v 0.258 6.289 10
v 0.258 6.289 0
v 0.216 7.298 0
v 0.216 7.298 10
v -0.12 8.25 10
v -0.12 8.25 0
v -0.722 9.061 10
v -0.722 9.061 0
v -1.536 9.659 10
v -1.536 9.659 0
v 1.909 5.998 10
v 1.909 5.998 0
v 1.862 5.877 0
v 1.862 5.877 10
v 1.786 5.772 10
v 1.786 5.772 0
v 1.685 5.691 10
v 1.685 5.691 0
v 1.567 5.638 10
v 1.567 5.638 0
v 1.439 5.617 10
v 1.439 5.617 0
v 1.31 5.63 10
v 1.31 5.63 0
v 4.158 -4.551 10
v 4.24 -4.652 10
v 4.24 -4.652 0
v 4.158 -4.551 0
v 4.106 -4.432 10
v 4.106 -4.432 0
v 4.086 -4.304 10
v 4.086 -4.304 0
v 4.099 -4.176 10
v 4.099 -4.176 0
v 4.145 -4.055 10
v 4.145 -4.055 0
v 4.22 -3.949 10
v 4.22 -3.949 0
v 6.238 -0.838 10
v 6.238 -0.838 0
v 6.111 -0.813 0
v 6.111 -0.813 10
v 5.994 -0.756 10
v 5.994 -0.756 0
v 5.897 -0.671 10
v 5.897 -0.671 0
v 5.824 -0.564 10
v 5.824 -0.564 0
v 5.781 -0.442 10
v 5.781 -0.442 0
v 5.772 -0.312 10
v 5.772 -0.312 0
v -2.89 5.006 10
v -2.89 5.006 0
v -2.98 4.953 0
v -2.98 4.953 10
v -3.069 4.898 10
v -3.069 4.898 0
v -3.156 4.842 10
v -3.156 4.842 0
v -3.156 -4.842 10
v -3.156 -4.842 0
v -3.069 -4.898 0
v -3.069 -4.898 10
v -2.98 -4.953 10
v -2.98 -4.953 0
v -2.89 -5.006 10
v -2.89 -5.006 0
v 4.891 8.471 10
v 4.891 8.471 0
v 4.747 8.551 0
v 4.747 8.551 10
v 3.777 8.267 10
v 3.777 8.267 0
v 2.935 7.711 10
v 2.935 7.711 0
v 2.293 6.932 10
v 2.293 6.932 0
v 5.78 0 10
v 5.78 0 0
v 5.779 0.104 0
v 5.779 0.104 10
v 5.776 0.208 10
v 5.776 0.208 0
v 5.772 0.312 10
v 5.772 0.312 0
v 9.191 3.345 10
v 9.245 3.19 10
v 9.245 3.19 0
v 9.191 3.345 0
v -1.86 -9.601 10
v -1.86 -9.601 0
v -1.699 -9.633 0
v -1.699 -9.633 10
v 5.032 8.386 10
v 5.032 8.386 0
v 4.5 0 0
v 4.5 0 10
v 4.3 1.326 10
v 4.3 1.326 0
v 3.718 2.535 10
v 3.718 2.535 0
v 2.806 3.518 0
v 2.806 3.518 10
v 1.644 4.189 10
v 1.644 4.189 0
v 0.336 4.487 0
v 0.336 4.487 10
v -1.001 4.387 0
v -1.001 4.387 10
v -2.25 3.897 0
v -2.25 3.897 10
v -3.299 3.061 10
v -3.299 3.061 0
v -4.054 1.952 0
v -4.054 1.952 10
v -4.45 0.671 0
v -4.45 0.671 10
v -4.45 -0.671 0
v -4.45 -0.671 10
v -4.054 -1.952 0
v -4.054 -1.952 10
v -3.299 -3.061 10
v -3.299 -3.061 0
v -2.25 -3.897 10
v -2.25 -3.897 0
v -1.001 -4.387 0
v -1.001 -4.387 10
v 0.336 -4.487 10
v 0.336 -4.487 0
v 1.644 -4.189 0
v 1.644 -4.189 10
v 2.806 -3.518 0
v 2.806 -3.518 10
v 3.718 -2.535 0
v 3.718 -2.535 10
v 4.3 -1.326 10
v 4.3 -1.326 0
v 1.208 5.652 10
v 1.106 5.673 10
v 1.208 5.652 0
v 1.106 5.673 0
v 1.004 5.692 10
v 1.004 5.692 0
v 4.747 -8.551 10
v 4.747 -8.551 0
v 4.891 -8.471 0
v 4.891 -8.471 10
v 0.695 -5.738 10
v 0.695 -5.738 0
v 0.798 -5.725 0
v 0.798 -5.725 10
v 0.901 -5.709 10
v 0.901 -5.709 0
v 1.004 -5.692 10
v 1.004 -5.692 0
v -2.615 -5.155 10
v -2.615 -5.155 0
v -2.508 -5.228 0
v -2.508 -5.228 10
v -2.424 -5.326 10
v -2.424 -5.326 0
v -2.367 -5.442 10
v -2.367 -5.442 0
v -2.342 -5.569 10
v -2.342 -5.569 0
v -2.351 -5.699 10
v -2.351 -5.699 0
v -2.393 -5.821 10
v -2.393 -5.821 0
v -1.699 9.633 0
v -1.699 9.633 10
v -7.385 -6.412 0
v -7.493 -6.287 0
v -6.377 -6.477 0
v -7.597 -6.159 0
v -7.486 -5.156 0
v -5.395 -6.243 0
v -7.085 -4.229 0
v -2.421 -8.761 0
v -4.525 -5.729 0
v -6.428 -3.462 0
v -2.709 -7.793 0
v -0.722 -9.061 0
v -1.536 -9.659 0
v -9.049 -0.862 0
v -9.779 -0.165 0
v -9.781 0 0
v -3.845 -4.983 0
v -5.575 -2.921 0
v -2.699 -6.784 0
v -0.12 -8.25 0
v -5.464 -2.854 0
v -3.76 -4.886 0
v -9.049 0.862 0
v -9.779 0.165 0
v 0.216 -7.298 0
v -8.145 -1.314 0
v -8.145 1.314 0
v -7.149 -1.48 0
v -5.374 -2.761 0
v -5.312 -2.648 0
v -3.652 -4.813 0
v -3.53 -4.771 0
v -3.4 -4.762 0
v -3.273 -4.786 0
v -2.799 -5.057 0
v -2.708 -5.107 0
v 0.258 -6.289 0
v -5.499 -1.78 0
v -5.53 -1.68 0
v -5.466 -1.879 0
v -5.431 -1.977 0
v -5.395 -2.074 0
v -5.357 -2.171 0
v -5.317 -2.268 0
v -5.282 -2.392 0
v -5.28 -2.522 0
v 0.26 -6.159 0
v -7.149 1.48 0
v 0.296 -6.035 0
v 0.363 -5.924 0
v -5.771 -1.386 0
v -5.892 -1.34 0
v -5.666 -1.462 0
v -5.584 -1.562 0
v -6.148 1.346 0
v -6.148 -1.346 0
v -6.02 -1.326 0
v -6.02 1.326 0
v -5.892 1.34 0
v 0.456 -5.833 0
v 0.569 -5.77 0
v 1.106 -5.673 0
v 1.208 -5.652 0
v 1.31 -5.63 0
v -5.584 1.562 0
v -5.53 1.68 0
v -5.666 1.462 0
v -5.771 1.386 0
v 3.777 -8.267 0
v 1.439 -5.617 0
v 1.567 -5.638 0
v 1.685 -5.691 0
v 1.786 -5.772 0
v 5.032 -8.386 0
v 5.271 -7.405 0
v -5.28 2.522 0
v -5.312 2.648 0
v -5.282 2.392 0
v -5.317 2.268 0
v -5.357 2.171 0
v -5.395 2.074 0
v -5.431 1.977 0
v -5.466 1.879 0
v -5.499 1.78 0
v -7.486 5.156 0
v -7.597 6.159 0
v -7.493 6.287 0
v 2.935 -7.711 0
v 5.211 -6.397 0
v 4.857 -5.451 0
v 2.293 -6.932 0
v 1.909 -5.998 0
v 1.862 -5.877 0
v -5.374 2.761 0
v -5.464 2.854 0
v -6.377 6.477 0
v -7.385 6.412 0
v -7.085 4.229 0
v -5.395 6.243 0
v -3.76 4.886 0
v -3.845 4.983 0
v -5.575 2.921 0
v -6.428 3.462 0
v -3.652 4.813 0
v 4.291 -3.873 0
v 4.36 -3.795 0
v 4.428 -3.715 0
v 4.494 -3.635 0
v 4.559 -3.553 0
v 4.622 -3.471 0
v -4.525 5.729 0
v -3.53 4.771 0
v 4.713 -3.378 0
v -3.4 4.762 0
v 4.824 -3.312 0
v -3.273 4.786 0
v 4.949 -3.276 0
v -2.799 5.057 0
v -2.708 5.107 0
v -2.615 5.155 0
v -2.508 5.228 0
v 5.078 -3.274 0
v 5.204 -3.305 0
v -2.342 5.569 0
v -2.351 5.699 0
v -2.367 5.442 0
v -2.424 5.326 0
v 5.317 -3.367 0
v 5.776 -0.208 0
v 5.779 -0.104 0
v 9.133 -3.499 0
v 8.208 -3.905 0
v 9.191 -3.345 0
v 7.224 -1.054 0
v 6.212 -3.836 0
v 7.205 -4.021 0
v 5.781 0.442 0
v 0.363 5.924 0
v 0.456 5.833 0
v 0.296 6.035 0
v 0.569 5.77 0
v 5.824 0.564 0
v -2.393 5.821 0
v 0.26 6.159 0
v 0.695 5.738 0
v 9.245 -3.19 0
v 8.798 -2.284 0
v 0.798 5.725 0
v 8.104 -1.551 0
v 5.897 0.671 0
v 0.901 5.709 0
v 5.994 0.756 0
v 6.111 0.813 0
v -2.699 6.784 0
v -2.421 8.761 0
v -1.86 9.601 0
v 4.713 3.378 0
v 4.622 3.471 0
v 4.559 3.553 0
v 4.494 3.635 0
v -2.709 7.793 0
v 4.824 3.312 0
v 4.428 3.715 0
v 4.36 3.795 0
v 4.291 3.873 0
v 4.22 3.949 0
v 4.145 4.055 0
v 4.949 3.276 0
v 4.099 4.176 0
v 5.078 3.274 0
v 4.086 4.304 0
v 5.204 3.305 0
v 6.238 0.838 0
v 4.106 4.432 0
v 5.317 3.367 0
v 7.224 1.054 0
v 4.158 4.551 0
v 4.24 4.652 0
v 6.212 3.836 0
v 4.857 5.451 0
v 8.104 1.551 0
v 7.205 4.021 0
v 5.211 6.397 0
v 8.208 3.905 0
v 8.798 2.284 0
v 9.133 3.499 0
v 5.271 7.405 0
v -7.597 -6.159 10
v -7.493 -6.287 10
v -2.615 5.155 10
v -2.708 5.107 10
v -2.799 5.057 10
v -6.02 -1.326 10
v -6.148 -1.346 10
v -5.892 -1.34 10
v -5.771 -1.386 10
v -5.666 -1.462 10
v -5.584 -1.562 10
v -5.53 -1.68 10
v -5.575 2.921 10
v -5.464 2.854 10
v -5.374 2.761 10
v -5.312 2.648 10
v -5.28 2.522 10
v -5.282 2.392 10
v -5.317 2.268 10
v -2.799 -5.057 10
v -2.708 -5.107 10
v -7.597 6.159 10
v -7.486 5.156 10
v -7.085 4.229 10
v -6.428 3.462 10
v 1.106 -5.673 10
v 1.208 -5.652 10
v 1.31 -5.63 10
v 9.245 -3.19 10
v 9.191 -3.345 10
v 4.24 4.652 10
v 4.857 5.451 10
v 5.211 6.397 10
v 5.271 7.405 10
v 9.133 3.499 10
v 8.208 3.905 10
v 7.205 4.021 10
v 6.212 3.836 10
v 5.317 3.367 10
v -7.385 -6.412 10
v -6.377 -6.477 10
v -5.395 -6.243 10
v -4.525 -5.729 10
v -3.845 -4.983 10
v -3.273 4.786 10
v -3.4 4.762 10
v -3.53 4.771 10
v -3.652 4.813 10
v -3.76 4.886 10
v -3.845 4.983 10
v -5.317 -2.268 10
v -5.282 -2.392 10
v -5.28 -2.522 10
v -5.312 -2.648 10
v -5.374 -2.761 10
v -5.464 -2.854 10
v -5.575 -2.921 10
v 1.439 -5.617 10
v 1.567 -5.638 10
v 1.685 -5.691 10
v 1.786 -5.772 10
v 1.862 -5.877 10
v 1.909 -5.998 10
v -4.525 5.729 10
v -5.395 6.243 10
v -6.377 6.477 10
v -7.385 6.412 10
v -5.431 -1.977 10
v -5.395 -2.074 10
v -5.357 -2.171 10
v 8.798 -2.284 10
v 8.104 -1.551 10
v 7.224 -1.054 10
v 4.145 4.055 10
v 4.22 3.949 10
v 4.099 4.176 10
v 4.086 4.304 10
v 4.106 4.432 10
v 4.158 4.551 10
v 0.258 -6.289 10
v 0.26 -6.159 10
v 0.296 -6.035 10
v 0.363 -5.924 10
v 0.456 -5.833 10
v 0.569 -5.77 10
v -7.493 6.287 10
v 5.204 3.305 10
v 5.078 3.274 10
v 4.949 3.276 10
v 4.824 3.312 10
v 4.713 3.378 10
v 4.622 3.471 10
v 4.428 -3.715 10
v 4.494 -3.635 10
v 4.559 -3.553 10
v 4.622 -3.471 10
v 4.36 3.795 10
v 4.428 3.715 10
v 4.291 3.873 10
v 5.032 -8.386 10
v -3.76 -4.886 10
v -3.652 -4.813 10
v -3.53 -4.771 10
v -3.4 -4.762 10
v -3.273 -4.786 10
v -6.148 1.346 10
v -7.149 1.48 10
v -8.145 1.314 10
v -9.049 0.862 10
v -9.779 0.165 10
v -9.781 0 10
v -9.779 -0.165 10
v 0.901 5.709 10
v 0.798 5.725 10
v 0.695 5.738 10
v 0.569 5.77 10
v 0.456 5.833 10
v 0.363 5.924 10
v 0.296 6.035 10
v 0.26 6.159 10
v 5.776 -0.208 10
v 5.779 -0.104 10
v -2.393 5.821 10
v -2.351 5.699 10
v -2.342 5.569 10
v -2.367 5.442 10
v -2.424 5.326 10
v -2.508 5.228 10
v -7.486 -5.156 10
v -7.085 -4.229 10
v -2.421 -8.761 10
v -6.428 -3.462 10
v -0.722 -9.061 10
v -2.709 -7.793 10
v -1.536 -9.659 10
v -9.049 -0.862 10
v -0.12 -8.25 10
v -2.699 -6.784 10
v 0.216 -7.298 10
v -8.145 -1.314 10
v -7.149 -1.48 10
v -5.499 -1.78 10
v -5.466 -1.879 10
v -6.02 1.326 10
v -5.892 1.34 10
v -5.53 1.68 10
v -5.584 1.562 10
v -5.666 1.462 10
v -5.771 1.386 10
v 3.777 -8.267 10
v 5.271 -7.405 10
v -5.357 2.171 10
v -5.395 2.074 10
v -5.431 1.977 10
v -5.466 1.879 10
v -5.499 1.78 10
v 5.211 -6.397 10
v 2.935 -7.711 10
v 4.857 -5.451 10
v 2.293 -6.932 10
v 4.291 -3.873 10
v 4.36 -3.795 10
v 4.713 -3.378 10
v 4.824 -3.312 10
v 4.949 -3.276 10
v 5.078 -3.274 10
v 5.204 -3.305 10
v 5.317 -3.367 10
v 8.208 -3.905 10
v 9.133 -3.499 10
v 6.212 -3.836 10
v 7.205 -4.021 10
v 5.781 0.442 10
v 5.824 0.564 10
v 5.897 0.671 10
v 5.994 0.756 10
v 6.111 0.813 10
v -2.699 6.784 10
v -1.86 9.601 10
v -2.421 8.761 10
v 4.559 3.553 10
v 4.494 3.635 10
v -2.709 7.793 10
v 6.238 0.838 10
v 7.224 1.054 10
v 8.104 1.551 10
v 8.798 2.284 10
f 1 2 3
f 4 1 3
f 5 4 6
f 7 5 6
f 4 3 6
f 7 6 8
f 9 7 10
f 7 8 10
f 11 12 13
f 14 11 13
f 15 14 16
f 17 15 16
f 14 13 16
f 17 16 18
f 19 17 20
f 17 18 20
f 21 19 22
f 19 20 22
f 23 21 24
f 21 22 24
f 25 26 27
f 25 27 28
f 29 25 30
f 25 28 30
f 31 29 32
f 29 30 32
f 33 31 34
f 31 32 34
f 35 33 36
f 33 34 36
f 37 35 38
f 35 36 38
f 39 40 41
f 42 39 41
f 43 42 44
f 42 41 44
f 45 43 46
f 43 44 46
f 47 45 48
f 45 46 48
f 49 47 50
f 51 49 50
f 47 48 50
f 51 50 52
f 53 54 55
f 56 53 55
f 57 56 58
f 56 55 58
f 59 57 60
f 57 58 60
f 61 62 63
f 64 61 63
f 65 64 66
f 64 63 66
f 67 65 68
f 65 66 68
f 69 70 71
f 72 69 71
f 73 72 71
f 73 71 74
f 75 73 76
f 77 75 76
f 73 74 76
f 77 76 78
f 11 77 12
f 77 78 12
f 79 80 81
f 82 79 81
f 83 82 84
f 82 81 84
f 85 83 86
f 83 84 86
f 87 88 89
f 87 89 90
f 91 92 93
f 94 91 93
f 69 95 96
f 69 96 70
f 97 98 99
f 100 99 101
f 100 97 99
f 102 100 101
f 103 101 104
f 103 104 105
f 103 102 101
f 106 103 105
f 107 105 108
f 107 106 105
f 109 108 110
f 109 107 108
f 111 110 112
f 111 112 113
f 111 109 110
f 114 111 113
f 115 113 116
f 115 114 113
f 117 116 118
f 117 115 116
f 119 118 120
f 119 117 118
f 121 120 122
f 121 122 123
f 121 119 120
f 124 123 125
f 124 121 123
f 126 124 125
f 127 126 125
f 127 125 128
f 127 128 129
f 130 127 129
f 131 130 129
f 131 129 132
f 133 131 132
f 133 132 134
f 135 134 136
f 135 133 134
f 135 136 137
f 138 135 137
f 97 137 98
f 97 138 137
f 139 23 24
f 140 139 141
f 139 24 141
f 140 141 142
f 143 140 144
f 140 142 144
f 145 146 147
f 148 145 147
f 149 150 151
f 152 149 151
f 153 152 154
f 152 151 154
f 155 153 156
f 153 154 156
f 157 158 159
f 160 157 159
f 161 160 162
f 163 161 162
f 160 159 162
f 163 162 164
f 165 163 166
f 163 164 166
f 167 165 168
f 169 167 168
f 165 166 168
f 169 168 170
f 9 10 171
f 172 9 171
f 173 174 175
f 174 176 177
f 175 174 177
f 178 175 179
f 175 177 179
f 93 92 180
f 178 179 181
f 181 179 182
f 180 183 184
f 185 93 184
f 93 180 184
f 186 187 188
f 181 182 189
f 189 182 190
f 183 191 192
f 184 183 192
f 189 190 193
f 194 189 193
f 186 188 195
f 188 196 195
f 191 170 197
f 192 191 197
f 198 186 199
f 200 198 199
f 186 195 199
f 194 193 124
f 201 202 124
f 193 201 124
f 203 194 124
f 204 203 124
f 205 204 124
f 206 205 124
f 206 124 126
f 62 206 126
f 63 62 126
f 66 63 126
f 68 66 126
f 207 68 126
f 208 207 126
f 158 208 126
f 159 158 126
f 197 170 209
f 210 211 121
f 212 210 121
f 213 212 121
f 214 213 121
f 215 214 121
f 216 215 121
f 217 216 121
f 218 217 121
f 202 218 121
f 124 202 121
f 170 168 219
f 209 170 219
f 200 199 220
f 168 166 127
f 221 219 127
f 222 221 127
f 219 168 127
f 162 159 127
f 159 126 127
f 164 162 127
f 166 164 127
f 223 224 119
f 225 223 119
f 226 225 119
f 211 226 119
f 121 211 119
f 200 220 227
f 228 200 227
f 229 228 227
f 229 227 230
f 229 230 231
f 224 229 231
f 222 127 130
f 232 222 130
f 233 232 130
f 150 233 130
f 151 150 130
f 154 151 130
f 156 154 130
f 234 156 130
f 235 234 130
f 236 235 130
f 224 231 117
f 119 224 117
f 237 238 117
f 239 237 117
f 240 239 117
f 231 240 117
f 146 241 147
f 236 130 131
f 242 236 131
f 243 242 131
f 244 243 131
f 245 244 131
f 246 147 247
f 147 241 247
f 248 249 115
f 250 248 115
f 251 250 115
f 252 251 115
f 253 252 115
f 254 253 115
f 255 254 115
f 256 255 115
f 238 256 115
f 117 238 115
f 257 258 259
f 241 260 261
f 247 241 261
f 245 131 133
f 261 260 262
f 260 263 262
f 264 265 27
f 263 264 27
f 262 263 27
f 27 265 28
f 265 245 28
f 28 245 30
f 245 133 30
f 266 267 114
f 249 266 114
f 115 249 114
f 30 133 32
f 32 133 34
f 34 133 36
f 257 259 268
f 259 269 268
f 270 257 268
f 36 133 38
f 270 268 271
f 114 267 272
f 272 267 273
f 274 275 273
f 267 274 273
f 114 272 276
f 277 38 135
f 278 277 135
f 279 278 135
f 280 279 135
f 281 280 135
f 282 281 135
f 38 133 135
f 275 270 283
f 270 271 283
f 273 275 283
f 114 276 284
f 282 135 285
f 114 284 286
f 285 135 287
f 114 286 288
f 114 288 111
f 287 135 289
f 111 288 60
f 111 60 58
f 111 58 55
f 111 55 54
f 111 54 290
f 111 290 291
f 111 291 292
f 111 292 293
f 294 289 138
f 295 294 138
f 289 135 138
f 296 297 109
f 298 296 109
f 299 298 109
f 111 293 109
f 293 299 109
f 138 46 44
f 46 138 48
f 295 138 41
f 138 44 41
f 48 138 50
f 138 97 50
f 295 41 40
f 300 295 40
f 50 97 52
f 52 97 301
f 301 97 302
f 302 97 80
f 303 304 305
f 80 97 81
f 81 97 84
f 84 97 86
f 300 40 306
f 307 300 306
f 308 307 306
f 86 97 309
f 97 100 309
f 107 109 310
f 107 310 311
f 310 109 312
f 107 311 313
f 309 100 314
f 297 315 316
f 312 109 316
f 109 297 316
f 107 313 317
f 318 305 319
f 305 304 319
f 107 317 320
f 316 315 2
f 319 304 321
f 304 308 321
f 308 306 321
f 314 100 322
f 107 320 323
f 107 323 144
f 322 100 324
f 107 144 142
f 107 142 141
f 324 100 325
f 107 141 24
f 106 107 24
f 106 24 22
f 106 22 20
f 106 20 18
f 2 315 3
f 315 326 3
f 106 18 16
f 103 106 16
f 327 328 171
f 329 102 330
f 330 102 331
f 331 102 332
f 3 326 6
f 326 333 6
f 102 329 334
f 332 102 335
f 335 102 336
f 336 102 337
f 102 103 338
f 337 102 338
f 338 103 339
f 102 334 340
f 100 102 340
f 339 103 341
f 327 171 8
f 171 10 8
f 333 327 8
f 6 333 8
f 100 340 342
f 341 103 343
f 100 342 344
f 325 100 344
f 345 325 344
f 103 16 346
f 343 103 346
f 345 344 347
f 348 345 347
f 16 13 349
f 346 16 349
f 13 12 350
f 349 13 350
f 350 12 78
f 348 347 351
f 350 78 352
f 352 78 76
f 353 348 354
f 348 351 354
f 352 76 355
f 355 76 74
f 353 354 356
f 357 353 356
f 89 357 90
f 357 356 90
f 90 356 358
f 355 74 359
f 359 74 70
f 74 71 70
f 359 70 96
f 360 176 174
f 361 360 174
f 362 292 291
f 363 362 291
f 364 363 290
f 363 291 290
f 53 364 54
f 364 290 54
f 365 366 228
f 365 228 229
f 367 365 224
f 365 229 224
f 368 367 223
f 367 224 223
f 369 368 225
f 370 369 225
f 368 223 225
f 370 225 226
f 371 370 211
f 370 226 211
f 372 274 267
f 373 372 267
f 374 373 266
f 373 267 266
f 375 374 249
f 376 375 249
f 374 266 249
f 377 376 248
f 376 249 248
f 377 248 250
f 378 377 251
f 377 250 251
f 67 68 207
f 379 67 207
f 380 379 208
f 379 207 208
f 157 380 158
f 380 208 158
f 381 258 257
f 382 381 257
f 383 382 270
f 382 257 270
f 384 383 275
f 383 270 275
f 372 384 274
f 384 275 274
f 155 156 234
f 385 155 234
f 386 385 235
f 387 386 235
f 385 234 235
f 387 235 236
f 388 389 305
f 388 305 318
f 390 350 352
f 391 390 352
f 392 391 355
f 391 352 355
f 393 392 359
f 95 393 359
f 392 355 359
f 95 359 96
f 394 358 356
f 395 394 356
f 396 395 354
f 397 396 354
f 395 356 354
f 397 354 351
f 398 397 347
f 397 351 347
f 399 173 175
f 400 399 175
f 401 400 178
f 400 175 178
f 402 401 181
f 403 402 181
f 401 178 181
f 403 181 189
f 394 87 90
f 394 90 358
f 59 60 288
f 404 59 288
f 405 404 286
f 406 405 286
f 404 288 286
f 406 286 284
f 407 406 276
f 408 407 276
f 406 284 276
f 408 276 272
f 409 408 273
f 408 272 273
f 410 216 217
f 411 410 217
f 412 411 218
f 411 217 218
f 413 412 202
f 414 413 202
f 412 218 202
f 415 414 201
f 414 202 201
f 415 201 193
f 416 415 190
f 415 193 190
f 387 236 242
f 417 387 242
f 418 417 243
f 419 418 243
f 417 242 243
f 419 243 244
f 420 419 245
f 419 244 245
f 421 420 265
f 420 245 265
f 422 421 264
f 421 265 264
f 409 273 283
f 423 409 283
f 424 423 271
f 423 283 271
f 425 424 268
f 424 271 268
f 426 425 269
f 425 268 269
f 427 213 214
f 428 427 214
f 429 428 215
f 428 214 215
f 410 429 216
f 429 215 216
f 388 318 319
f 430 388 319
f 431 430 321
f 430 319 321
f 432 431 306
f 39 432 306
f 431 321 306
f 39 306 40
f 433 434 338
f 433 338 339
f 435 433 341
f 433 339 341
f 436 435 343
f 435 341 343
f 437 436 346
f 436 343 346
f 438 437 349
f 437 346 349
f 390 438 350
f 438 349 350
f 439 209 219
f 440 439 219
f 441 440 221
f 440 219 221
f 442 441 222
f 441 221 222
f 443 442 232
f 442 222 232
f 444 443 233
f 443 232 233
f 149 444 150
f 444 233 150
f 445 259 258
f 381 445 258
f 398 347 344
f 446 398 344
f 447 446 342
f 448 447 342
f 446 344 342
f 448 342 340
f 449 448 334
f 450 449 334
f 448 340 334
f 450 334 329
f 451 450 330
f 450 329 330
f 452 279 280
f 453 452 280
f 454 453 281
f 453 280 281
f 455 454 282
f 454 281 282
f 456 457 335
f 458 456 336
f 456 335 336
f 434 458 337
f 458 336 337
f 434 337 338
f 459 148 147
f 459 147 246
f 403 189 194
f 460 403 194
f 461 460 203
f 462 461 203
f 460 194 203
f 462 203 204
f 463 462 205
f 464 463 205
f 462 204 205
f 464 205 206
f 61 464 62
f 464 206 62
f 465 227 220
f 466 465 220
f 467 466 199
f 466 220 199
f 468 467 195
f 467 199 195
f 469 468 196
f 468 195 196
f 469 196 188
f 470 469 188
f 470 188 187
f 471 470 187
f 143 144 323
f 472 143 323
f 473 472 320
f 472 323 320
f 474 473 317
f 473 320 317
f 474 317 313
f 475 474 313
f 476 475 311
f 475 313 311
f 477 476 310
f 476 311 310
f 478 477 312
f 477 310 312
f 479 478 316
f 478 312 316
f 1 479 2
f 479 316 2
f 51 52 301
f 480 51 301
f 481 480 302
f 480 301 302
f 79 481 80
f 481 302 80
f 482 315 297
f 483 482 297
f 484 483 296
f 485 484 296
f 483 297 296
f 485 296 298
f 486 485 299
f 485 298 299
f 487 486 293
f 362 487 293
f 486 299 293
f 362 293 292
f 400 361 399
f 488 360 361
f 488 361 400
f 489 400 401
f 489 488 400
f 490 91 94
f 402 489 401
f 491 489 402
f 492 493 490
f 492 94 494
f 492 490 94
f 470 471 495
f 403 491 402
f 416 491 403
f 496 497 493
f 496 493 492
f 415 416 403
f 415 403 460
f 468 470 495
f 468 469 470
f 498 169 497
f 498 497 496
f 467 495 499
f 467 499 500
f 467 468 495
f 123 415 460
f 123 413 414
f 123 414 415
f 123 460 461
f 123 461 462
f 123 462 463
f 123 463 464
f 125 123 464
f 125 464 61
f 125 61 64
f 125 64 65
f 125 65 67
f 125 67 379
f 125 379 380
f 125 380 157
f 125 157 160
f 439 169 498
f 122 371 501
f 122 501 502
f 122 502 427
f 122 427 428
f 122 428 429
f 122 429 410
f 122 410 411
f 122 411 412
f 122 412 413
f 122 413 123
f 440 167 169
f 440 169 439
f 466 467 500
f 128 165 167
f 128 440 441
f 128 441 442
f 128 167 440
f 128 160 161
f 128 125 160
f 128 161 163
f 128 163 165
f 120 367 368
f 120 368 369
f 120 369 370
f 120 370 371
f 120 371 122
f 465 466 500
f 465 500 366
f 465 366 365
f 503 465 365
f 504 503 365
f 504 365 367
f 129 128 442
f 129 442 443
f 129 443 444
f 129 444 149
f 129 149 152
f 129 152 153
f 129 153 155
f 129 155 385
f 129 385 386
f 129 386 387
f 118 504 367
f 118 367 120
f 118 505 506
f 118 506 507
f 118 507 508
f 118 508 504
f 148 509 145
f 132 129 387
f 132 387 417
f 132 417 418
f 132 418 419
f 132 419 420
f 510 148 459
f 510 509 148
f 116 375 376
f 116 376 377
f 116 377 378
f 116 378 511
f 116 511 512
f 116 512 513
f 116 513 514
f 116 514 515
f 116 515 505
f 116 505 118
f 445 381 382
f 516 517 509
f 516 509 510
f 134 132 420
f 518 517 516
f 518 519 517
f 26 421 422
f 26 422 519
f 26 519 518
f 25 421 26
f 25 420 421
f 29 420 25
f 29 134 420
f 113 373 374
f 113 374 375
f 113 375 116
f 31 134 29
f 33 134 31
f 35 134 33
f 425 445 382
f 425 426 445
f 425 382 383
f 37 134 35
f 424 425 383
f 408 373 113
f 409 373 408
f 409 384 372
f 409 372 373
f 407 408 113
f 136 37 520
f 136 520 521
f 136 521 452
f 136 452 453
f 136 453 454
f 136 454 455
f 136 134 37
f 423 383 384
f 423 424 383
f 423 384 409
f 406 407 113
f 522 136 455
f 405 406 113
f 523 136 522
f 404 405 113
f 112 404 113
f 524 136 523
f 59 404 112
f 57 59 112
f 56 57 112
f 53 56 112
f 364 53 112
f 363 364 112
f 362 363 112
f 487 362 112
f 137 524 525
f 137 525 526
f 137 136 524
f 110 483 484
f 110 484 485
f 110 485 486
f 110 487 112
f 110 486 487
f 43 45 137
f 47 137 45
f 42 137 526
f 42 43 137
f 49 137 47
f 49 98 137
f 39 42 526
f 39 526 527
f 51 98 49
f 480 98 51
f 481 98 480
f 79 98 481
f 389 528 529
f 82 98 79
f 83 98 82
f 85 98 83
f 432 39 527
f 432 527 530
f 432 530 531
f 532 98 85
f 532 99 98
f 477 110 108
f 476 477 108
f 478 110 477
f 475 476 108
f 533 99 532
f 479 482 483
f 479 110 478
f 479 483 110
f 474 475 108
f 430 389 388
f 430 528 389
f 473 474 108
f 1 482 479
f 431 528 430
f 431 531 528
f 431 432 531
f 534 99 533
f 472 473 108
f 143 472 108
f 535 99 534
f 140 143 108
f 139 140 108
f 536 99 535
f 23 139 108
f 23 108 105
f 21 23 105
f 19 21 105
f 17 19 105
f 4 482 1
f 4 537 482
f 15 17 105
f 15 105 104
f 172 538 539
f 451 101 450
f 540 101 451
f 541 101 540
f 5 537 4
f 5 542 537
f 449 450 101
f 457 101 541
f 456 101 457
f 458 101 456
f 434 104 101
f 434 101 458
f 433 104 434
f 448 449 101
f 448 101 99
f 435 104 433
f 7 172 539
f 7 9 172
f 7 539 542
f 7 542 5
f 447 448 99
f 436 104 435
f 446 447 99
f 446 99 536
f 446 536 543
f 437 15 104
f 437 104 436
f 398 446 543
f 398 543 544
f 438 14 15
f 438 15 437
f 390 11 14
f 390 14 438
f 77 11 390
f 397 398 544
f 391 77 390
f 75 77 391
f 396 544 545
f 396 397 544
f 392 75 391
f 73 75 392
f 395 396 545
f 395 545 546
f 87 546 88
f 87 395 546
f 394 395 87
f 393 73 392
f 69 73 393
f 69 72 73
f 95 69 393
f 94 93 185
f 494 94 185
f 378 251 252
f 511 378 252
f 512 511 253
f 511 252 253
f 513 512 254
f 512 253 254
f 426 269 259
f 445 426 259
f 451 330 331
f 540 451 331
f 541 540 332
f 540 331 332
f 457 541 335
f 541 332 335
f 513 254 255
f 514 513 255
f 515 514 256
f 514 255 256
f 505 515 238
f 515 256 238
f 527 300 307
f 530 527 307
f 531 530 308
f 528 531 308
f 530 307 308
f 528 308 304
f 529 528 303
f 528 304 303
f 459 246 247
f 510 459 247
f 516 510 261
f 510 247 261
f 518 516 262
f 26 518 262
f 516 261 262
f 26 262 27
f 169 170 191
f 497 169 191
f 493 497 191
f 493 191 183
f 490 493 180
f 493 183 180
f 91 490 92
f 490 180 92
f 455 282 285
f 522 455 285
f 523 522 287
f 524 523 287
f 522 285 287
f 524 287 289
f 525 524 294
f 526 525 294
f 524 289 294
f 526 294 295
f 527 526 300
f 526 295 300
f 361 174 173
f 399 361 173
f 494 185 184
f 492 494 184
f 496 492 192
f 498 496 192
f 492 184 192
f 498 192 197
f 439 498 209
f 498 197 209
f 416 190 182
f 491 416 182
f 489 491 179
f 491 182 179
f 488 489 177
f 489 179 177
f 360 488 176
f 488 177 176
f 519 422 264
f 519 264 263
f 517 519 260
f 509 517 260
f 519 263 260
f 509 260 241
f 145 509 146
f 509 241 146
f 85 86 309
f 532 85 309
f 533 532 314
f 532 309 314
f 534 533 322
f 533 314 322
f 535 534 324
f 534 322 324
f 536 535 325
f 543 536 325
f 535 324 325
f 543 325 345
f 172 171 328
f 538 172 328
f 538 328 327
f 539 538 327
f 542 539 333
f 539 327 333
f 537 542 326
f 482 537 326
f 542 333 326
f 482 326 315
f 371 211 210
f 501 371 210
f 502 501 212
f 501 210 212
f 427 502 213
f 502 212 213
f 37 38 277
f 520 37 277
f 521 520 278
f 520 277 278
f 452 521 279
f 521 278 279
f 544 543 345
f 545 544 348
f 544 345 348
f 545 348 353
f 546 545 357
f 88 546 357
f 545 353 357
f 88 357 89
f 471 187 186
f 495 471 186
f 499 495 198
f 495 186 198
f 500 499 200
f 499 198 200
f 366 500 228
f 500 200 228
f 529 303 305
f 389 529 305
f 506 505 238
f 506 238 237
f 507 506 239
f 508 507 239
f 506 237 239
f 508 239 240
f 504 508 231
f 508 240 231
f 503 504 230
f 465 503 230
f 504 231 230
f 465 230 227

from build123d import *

# Parameters (mm, degrees)
F0_R     = 4.5
F1_DEPTH = 10


with BuildPart() as f1:
    # F0 (on Top) → F1 (new body)
    with BuildSketch(Plane.XY):
        with BuildLine():
            ThreePointArc((-2.392851, 5.821348), (-2.36707, 5.442285), (-2.615174, 5.154538))
            ThreePointArc((-2.615174, 5.154538), (-2.753594, 5.081941), (-2.89, 5.005627))
            ThreePointArc((-2.89, 5.005627), (-3.024293, 4.925652), (-3.156374, 4.842076))
            ThreePointArc((-3.156374, 4.842076), (-3.529622, 4.771085), (-3.84501, 4.982943))
            ThreePointArc((-3.84501, 4.982943), (-5.394961, 6.242549), (-7.385022, 6.411696))
            Line((-7.385022, 6.411696), (-7.492977, 6.287354))
            Line((-7.492977, 6.287354), (-7.596684, 6.159448))
            ThreePointArc((-7.596684, 6.159448), (-7.084536, 4.228992), (-5.57492, 2.921316))
            ThreePointArc((-5.57492, 2.921316), (-5.311514, 2.647509), (-5.316613, 2.267604))
            ThreePointArc((-5.316613, 2.267604), (-5.375984, 2.123017), (-5.431423, 1.976876))
            ThreePointArc((-5.431423, 1.976876), (-5.482891, 1.829291), (-5.53035, 1.680367))
            ThreePointArc((-5.53035, 1.680367), (-5.770641, 1.386066), (-6.148423, 1.345631))
            ThreePointArc((-6.148423, 1.345631), (-8.145413, 1.314256), (-9.778614, 0.164643))
            Line((-9.778614, 0.164643), (-9.781386, 0))
            Line((-9.781386, 0), (-9.778614, -0.164643))
            ThreePointArc((-9.778614, -0.164643), (-8.145413, -1.314256), (-6.148423, -1.345631))
            ThreePointArc((-6.148423, -1.345631), (-5.770641, -1.386066), (-5.53035, -1.680367))
            ThreePointArc((-5.53035, -1.680367), (-5.482891, -1.829291), (-5.431423, -1.976876))
            ThreePointArc((-5.431423, -1.976876), (-5.375984, -2.123017), (-5.316613, -2.267604))
            ThreePointArc((-5.316613, -2.267604), (-5.311514, -2.647509), (-5.57492, -2.921316))
            ThreePointArc((-5.57492, -2.921316), (-7.084536, -4.228992), (-7.596684, -6.159448))
            Line((-7.596684, -6.159448), (-7.492977, -6.287354))
            Line((-7.492977, -6.287354), (-7.385022, -6.411696))
            ThreePointArc((-7.385022, -6.411696), (-5.394961, -6.242549), (-3.84501, -4.982943))
            ThreePointArc((-3.84501, -4.982943), (-3.529622, -4.771085), (-3.156374, -4.842076))
            ThreePointArc((-3.156374, -4.842076), (-3.024293, -4.925652), (-2.89, -5.005627))
            ThreePointArc((-2.89, -5.005627), (-2.753594, -5.081941), (-2.615174, -5.154538))
            ThreePointArc((-2.615174, -5.154538), (-2.36707, -5.442285), (-2.392851, -5.821348))
            ThreePointArc((-2.392851, -5.821348), (-2.708726, -7.793448), (-1.860181, -9.601465))
            Line((-1.860181, -9.601465), (-1.69852, -9.632785))
            Line((-1.69852, -9.632785), (-1.535897, -9.658645))
            ThreePointArc((-1.535897, -9.658645), (-0.120147, -8.249884), (0.257526, -6.288681))
            ThreePointArc((0.257526, -6.288681), (0.362947, -5.92366), (0.694504, -5.738124))
            ThreePointArc((0.694504, -5.738124), (0.849406, -5.717247), (1.003686, -5.692189))
            ThreePointArc((1.003686, -5.692189), (1.157233, -5.662968), (1.309934, -5.629607))
            ThreePointArc((1.309934, -5.629607), (1.684953, -5.690555), (1.90886, -5.997506))
            ThreePointArc((1.90886, -5.997506), (2.934527, -7.711263), (4.746722, -8.55085))
            Line((4.746722, -8.55085), (4.890693, -8.470929))
            Line((4.890693, -8.470929), (5.031892, -8.386207))
            ThreePointArc((5.031892, -8.386207), (5.210886, -6.397007), (4.239562, -4.651875))
            ThreePointArc((4.239562, -4.651875), (4.085689, -4.304489), (4.220415, -3.94924))
            ThreePointArc((4.220415, -3.94924), (4.325658, -3.833678), (4.427737, -3.715312))
            ThreePointArc((4.427737, -3.715312), (4.526578, -3.59423), (4.622109, -3.47052))
            ThreePointArc((4.622109, -3.47052), (4.948567, -3.276151), (5.317394, -3.367364))
            ThreePointArc((5.317394, -3.367364), (7.204682, -4.020892), (9.13258, -3.499197))
            Line((9.13258, -3.499197), (9.191496, -3.345431))
            Line((9.191496, -3.345431), (9.245203, -3.189769))
            ThreePointArc((9.245203, -3.189769), (8.103686, -1.550899), (6.23786, -0.838405))
            ThreePointArc((6.23786, -0.838405), (5.896692, -0.6712), (5.771548, -0.312462))
            ThreePointArc((5.771548, -0.312462), (5.777887, -0.156288), (5.78, 0))
            ThreePointArc((5.78, 0), (5.777887, 0.156288), (5.771548, 0.312462))
            ThreePointArc((5.771548, 0.312462), (5.896692, 0.6712), (6.23786, 0.838405))
            ThreePointArc((6.23786, 0.838405), (8.103686, 1.550899), (9.245203, 3.189769))
            Line((9.245203, 3.189769), (9.191496, 3.345431))
            Line((9.191496, 3.345431), (9.13258, 3.499197))
            ThreePointArc((9.13258, 3.499197), (7.204682, 4.020892), (5.317394, 3.367364))
            ThreePointArc((5.317394, 3.367364), (4.948567, 3.276151), (4.622109, 3.47052))
            ThreePointArc((4.622109, 3.47052), (4.526578, 3.59423), (4.427737, 3.715312))
            ThreePointArc((4.427737, 3.715312), (4.325658, 3.833678), (4.220415, 3.94924))
            ThreePointArc((4.220415, 3.94924), (4.085689, 4.304489), (4.239562, 4.651875))
            ThreePointArc((4.239562, 4.651875), (5.210886, 6.397007), (5.031892, 8.386207))
            Line((5.031892, 8.386207), (4.890693, 8.470929))
            Line((4.890693, 8.470929), (4.746722, 8.55085))
            ThreePointArc((4.746722, 8.55085), (2.934527, 7.711263), (1.90886, 5.997506))
            ThreePointArc((1.90886, 5.997506), (1.684953, 5.690555), (1.309934, 5.629607))
            ThreePointArc((1.309934, 5.629607), (1.157233, 5.662968), (1.003686, 5.692189))
            ThreePointArc((1.003686, 5.692189), (0.849406, 5.717247), (0.694504, 5.738124))
            ThreePointArc((0.694504, 5.738124), (0.362947, 5.92366), (0.257526, 6.288681))
            ThreePointArc((0.257526, 6.288681), (-0.120147, 8.249884), (-1.535897, 9.658645))
            Line((-1.535897, 9.658645), (-1.69852, 9.632785))
            Line((-1.69852, 9.632785), (-1.860181, 9.601465))
            ThreePointArc((-1.860181, 9.601465), (-2.708726, 7.793448), (-2.392851, 5.821348))
        make_face()
        Circle(F0_R, mode=Mode.SUBTRACT)
    extrude(amount=F1_DEPTH)


solid = f1.part
